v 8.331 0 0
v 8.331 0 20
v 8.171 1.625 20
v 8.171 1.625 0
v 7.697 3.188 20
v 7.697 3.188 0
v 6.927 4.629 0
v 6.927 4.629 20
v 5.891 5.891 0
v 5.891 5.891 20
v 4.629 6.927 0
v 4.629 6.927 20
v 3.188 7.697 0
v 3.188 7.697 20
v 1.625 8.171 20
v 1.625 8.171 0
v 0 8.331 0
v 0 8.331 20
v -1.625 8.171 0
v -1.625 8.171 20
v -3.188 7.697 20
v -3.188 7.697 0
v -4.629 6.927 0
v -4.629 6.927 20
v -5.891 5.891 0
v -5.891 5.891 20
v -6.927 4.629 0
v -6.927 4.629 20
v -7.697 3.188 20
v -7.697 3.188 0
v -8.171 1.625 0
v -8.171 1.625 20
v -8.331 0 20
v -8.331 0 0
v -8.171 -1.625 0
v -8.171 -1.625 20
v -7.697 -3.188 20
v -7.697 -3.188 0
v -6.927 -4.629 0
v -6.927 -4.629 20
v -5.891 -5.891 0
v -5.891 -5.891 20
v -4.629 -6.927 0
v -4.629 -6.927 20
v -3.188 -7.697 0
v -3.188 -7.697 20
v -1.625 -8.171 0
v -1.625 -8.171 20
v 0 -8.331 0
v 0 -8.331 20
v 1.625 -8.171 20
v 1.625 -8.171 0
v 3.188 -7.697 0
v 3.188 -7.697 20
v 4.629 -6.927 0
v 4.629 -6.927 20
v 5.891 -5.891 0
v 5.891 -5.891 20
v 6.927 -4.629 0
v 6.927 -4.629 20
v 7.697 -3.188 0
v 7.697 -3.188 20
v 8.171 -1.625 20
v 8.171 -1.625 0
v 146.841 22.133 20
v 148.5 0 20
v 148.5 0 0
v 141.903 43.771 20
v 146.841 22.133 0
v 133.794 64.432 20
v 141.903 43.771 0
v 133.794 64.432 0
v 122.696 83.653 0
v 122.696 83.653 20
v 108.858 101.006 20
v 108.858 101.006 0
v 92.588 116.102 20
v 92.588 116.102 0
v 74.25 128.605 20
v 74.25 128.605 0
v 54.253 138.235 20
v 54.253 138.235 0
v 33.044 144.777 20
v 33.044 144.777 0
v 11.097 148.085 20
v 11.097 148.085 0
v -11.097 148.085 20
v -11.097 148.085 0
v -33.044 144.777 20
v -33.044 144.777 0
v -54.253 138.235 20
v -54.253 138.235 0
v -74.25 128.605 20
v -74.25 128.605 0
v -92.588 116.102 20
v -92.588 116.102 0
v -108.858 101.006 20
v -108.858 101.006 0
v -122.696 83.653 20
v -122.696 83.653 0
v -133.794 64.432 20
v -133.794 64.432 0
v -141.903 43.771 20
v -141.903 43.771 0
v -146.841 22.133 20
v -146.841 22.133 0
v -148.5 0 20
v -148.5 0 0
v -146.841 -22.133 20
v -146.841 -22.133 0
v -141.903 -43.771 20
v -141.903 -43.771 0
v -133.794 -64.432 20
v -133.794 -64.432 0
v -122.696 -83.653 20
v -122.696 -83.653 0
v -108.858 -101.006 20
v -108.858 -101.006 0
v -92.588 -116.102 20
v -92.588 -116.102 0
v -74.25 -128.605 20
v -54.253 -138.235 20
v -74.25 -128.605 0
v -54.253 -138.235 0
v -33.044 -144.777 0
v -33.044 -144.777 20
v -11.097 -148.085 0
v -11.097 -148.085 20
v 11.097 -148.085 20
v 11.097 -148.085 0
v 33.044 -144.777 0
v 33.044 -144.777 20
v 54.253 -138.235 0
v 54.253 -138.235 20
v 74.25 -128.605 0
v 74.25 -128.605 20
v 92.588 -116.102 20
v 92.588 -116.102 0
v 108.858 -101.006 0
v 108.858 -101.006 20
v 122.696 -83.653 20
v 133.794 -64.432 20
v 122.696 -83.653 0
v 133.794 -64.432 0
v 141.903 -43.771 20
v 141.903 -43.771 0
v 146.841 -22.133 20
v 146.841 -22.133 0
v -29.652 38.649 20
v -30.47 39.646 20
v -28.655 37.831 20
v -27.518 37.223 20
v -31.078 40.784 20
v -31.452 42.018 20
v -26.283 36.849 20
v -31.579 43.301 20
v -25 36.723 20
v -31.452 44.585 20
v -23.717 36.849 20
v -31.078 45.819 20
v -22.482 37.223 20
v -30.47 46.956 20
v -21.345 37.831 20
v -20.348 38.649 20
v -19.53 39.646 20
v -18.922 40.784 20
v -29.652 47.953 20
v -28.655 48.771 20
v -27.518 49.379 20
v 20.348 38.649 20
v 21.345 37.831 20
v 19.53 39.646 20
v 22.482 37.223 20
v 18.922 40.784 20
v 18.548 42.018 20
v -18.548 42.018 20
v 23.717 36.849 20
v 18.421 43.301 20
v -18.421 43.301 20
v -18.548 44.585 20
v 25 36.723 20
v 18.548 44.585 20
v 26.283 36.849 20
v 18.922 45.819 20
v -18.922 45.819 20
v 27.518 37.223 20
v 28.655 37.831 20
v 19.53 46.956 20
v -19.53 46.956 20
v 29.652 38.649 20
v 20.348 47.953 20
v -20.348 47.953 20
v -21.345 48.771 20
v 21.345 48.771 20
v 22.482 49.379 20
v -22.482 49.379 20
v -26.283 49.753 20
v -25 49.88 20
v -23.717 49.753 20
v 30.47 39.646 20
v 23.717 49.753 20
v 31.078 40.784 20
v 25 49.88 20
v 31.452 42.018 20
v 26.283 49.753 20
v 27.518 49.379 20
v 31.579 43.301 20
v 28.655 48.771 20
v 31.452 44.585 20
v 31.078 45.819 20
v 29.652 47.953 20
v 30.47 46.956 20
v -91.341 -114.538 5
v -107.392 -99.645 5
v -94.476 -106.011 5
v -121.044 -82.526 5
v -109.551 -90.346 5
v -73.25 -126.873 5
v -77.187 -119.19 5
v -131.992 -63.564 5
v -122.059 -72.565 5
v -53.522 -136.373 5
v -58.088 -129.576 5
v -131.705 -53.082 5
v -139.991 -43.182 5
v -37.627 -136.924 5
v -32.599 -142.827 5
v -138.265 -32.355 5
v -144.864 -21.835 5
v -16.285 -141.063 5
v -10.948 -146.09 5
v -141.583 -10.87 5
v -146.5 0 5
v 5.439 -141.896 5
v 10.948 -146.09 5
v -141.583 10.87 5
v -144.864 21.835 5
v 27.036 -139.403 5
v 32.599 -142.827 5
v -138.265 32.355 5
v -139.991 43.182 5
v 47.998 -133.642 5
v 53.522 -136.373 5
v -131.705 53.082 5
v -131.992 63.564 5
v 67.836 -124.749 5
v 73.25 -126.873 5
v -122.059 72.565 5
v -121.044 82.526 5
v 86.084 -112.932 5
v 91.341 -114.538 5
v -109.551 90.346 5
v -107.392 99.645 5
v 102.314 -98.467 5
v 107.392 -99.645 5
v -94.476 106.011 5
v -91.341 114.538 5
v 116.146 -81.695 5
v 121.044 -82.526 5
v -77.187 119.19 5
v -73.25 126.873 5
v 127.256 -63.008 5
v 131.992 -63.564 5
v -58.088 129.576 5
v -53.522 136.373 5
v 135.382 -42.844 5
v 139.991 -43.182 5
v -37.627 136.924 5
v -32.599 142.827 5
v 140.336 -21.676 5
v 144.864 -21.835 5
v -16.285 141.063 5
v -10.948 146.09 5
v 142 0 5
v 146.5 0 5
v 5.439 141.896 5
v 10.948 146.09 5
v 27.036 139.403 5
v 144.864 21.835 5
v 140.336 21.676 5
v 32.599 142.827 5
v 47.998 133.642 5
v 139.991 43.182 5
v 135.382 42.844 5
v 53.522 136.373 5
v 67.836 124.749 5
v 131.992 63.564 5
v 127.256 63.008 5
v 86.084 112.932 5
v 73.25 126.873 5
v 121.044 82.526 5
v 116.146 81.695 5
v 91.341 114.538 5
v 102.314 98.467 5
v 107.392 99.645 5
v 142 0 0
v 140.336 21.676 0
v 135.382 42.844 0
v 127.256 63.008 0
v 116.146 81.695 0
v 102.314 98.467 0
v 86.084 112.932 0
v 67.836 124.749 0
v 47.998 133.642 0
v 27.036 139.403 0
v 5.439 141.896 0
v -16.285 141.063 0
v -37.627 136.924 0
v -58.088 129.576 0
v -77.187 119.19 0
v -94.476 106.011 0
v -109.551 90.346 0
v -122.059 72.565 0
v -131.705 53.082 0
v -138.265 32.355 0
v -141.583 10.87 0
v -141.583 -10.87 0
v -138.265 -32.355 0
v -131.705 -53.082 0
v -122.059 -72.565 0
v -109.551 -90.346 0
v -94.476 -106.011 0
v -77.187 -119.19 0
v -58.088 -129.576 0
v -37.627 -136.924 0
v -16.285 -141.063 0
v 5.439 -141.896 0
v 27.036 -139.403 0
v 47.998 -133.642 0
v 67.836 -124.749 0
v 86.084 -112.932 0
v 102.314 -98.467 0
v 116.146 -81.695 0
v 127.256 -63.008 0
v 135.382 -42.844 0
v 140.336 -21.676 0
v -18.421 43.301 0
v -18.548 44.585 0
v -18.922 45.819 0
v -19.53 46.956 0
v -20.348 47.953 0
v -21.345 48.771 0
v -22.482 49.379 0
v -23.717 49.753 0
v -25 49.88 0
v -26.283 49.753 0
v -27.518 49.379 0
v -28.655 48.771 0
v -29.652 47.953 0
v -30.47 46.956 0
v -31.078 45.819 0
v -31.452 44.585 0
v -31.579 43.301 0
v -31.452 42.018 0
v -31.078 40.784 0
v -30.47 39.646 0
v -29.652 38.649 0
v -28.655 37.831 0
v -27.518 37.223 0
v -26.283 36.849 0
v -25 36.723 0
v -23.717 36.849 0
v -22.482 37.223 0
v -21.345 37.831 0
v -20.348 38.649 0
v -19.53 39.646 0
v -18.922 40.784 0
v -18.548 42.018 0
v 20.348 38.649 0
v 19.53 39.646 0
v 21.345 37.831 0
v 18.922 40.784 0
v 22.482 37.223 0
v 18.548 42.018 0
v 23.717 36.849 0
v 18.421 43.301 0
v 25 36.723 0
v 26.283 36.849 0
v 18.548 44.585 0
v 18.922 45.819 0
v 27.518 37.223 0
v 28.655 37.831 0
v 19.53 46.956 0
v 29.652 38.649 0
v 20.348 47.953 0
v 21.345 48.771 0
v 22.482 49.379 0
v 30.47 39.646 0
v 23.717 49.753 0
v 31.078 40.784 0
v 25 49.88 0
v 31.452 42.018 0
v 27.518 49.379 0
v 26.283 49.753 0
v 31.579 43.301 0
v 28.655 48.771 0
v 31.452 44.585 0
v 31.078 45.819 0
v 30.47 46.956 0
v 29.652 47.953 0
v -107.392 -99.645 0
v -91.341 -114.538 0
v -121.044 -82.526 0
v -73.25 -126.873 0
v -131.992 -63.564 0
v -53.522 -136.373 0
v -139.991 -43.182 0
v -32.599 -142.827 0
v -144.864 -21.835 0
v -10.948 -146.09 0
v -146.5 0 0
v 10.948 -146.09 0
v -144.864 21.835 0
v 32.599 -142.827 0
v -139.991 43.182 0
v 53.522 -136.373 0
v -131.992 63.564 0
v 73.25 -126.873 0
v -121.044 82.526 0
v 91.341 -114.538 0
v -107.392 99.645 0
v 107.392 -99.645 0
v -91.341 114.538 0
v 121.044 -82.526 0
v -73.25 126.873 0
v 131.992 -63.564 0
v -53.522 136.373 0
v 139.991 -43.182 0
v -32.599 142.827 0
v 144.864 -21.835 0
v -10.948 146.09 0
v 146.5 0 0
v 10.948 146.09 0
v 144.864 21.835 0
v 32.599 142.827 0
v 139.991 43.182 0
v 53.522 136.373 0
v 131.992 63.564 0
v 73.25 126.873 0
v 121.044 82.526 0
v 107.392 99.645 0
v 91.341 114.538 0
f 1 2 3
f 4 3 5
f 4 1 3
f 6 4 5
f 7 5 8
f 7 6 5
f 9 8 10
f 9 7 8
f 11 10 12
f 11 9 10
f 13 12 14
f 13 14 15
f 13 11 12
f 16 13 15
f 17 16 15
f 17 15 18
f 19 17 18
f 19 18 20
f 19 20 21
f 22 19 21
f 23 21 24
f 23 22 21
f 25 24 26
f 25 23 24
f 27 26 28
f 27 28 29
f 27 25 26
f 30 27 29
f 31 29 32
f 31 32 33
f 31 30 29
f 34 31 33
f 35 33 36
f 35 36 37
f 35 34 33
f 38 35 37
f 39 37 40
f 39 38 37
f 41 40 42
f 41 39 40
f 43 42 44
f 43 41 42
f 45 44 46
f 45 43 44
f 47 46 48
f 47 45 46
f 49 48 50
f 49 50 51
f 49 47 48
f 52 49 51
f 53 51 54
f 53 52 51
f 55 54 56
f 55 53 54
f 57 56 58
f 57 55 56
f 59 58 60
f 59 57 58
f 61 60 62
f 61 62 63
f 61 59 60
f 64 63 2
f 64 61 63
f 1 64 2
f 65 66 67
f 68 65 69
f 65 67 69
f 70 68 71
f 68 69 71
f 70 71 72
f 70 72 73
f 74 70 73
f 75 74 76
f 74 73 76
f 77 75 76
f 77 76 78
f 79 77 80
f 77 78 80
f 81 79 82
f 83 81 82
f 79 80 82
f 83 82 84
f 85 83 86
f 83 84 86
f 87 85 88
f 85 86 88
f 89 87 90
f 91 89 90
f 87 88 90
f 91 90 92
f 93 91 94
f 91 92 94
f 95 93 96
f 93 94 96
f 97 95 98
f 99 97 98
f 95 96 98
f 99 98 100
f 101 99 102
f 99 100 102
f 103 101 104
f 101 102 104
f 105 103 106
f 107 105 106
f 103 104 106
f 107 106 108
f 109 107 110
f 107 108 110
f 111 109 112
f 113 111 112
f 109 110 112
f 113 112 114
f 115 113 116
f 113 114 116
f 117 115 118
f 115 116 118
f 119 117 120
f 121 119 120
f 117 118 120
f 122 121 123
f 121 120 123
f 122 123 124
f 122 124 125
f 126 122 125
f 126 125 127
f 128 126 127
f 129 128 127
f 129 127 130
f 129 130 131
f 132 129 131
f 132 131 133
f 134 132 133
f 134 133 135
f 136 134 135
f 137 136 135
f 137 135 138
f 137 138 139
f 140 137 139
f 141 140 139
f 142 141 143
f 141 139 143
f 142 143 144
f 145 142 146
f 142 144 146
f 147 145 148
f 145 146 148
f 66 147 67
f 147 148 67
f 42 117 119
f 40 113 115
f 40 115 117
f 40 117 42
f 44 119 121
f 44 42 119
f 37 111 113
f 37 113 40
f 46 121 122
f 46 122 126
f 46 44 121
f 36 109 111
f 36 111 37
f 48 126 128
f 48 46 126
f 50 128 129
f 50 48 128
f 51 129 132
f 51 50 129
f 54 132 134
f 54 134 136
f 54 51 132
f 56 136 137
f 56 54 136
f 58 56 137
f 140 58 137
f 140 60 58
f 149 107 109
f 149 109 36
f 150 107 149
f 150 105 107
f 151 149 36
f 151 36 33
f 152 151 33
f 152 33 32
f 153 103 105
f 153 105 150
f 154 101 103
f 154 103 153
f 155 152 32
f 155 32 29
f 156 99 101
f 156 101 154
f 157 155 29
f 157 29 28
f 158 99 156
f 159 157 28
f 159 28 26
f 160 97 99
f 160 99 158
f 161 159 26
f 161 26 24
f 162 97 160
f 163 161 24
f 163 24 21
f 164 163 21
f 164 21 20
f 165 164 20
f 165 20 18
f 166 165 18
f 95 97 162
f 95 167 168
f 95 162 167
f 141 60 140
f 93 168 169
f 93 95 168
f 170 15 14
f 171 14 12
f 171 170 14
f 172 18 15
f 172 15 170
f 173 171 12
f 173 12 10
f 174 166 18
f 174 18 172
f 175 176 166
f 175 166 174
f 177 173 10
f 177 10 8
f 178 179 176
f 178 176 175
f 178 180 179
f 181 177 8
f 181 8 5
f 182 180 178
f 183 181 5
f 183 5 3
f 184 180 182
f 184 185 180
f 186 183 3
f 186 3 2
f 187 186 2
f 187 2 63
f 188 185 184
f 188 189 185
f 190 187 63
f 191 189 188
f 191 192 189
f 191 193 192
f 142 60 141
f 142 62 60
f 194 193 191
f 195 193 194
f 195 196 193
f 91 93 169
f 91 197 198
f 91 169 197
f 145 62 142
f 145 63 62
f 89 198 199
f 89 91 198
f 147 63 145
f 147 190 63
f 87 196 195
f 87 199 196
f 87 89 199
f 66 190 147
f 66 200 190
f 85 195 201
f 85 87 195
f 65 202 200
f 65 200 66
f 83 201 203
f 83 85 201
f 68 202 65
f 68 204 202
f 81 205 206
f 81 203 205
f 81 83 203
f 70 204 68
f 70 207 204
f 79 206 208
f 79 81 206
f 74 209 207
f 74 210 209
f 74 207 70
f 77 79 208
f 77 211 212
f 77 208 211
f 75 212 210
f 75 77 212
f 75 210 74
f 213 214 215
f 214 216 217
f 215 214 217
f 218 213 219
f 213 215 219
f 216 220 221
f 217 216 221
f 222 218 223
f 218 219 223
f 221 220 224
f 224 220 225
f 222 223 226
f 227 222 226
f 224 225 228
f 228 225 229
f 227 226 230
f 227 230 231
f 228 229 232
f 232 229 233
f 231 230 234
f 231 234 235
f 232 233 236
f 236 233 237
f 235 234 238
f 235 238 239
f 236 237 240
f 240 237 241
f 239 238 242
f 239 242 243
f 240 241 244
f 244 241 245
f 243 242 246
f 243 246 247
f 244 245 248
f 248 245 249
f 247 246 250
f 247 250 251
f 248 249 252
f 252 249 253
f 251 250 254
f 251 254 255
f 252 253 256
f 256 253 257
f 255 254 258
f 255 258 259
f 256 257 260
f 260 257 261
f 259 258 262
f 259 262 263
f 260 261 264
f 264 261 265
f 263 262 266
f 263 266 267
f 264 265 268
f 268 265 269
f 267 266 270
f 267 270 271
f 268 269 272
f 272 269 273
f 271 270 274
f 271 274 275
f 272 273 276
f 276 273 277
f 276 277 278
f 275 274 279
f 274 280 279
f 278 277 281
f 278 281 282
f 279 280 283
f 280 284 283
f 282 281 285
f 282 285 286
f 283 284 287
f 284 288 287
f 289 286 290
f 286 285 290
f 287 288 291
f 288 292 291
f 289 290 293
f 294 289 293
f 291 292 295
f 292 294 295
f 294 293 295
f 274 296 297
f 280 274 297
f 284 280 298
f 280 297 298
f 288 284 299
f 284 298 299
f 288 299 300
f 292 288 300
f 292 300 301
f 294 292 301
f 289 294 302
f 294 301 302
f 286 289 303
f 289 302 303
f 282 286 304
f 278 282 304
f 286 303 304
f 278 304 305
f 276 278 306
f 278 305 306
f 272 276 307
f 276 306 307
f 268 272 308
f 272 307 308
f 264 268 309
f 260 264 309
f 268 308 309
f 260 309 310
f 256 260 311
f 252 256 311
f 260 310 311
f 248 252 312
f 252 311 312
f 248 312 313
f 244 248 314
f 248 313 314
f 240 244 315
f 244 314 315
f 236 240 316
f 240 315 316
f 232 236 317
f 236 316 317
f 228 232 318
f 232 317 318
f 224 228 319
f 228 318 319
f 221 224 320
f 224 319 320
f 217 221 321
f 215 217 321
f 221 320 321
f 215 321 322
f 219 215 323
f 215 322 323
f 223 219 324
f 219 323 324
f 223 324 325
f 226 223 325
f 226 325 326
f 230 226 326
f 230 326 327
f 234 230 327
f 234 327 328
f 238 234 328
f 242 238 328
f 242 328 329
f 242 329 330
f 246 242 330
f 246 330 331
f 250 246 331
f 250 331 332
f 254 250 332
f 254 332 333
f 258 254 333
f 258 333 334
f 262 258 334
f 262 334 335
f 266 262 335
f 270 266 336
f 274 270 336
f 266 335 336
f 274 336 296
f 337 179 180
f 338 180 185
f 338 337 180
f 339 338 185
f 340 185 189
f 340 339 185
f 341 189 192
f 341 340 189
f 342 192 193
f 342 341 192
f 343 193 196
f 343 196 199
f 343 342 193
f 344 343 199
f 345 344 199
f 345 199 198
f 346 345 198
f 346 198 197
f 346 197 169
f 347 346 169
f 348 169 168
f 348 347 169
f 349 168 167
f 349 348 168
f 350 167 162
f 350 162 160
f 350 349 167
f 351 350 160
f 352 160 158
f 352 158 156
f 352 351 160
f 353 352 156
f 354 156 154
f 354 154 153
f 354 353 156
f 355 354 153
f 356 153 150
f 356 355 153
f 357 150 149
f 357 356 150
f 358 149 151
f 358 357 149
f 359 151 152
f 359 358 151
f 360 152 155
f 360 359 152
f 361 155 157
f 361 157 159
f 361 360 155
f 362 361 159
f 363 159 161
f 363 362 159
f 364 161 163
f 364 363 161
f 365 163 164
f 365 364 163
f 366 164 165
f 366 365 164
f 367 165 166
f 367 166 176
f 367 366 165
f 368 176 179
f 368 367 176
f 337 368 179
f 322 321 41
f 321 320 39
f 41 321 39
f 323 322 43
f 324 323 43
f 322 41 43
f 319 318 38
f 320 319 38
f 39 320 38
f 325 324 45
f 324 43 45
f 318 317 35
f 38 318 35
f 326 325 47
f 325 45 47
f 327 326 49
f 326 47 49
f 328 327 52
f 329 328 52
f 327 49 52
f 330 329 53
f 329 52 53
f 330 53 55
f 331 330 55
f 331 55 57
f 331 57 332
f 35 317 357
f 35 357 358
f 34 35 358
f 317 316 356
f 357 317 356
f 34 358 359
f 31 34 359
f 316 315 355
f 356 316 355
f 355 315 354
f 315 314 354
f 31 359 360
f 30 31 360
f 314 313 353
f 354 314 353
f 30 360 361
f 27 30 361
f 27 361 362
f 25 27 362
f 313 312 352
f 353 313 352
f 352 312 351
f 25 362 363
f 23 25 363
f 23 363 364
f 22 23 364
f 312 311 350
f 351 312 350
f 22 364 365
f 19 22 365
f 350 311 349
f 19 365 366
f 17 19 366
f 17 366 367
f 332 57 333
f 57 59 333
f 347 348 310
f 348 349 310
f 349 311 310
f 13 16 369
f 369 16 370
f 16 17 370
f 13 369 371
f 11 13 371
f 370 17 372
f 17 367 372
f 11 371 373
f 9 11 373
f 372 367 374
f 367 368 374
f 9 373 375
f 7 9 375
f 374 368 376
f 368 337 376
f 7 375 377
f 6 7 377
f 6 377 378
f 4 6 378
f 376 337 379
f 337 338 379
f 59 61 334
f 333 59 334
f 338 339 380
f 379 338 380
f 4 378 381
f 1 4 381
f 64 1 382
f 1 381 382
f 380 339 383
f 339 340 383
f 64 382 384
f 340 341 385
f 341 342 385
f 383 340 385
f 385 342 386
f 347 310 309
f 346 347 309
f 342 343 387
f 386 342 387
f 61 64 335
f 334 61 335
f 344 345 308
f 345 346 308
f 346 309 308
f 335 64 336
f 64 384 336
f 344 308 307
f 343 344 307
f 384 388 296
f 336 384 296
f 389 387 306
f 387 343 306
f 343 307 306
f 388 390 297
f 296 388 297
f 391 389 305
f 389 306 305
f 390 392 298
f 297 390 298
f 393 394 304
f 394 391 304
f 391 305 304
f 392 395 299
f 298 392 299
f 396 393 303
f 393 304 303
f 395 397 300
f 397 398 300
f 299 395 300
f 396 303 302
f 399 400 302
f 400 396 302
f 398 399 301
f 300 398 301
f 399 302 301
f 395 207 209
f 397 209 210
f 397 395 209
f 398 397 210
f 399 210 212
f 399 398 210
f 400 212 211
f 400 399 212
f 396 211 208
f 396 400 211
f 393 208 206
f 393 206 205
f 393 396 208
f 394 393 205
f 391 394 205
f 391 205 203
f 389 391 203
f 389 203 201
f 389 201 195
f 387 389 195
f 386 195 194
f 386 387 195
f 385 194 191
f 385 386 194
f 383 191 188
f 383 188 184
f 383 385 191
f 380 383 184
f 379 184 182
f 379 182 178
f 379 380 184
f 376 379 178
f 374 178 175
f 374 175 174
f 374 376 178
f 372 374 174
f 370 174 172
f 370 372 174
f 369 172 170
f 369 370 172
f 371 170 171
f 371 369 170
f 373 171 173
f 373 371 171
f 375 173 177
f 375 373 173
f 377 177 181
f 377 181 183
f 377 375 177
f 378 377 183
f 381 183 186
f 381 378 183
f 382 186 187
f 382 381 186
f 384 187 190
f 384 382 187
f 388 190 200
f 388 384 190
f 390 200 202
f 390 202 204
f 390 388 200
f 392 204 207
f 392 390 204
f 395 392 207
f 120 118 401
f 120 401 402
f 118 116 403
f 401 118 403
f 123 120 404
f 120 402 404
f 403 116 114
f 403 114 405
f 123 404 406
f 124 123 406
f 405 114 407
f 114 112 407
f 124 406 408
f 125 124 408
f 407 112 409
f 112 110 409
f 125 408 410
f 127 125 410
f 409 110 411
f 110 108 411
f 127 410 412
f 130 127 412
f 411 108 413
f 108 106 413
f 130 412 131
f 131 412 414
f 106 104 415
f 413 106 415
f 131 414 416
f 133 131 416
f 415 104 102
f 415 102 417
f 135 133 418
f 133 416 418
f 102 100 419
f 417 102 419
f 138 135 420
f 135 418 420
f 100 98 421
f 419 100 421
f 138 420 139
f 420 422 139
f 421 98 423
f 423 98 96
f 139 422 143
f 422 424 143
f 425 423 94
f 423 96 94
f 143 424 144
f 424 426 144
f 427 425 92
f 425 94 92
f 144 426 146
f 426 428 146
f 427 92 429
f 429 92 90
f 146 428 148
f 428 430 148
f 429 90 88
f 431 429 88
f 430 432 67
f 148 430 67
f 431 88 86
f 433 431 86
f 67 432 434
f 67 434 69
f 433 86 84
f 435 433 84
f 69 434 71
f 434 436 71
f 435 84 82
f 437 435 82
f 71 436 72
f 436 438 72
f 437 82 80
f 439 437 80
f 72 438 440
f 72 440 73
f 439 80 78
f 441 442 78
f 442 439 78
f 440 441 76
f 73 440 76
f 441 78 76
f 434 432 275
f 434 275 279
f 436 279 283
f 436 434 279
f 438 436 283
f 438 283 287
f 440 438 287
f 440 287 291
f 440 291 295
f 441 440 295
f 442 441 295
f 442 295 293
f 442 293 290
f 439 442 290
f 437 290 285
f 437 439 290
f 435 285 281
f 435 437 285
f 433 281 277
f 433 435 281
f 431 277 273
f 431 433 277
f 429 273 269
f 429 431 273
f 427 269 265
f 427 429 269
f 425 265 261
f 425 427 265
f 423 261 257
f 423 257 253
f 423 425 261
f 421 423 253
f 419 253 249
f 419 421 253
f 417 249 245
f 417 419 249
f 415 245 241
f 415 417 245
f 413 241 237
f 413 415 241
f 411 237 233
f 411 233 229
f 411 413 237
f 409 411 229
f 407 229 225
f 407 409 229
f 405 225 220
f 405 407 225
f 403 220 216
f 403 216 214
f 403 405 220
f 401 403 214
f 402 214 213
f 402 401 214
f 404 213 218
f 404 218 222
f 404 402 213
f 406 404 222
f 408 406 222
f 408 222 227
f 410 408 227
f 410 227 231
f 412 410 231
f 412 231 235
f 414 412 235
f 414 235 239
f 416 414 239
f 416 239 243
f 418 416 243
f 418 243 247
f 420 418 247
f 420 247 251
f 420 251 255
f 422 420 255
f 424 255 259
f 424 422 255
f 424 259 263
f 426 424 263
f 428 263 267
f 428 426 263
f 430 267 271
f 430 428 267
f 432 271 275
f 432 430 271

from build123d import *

# Parameters (mm, degrees)
F0_R     = 148.5
F0_R_2   = 6.5786
F0_R_3   = 8.3312
F1_DEPTH = 20
F2_R     = 146.5
F2_R_2   = 142
F3_DEPTH = 5


# Not quite as in the source:
# - a feature names something its author has since deleted; it is built from what else it names


with BuildPart() as f1:
    # F0 (on Top) → F1 (new body)
    with BuildSketch(Plane.XY):
        Circle(F0_R)
        with Locations((-25, 43.3012701892)):
            Circle(F0_R_2, mode=Mode.SUBTRACT)
        Circle(F0_R_3, mode=Mode.SUBTRACT)
        with Locations((25, 43.3012701892)):
            Circle(F0_R_2, mode=Mode.SUBTRACT)
    extrude(amount=F1_DEPTH)

    # F2 (on face) → F3 (cut)
    with BuildSketch(Plane.XY):
        Circle(F2_R)
        Circle(F2_R_2, mode=Mode.SUBTRACT)
    extrude(amount=F3_DEPTH, mode=Mode.SUBTRACT)


solid = f1.part
